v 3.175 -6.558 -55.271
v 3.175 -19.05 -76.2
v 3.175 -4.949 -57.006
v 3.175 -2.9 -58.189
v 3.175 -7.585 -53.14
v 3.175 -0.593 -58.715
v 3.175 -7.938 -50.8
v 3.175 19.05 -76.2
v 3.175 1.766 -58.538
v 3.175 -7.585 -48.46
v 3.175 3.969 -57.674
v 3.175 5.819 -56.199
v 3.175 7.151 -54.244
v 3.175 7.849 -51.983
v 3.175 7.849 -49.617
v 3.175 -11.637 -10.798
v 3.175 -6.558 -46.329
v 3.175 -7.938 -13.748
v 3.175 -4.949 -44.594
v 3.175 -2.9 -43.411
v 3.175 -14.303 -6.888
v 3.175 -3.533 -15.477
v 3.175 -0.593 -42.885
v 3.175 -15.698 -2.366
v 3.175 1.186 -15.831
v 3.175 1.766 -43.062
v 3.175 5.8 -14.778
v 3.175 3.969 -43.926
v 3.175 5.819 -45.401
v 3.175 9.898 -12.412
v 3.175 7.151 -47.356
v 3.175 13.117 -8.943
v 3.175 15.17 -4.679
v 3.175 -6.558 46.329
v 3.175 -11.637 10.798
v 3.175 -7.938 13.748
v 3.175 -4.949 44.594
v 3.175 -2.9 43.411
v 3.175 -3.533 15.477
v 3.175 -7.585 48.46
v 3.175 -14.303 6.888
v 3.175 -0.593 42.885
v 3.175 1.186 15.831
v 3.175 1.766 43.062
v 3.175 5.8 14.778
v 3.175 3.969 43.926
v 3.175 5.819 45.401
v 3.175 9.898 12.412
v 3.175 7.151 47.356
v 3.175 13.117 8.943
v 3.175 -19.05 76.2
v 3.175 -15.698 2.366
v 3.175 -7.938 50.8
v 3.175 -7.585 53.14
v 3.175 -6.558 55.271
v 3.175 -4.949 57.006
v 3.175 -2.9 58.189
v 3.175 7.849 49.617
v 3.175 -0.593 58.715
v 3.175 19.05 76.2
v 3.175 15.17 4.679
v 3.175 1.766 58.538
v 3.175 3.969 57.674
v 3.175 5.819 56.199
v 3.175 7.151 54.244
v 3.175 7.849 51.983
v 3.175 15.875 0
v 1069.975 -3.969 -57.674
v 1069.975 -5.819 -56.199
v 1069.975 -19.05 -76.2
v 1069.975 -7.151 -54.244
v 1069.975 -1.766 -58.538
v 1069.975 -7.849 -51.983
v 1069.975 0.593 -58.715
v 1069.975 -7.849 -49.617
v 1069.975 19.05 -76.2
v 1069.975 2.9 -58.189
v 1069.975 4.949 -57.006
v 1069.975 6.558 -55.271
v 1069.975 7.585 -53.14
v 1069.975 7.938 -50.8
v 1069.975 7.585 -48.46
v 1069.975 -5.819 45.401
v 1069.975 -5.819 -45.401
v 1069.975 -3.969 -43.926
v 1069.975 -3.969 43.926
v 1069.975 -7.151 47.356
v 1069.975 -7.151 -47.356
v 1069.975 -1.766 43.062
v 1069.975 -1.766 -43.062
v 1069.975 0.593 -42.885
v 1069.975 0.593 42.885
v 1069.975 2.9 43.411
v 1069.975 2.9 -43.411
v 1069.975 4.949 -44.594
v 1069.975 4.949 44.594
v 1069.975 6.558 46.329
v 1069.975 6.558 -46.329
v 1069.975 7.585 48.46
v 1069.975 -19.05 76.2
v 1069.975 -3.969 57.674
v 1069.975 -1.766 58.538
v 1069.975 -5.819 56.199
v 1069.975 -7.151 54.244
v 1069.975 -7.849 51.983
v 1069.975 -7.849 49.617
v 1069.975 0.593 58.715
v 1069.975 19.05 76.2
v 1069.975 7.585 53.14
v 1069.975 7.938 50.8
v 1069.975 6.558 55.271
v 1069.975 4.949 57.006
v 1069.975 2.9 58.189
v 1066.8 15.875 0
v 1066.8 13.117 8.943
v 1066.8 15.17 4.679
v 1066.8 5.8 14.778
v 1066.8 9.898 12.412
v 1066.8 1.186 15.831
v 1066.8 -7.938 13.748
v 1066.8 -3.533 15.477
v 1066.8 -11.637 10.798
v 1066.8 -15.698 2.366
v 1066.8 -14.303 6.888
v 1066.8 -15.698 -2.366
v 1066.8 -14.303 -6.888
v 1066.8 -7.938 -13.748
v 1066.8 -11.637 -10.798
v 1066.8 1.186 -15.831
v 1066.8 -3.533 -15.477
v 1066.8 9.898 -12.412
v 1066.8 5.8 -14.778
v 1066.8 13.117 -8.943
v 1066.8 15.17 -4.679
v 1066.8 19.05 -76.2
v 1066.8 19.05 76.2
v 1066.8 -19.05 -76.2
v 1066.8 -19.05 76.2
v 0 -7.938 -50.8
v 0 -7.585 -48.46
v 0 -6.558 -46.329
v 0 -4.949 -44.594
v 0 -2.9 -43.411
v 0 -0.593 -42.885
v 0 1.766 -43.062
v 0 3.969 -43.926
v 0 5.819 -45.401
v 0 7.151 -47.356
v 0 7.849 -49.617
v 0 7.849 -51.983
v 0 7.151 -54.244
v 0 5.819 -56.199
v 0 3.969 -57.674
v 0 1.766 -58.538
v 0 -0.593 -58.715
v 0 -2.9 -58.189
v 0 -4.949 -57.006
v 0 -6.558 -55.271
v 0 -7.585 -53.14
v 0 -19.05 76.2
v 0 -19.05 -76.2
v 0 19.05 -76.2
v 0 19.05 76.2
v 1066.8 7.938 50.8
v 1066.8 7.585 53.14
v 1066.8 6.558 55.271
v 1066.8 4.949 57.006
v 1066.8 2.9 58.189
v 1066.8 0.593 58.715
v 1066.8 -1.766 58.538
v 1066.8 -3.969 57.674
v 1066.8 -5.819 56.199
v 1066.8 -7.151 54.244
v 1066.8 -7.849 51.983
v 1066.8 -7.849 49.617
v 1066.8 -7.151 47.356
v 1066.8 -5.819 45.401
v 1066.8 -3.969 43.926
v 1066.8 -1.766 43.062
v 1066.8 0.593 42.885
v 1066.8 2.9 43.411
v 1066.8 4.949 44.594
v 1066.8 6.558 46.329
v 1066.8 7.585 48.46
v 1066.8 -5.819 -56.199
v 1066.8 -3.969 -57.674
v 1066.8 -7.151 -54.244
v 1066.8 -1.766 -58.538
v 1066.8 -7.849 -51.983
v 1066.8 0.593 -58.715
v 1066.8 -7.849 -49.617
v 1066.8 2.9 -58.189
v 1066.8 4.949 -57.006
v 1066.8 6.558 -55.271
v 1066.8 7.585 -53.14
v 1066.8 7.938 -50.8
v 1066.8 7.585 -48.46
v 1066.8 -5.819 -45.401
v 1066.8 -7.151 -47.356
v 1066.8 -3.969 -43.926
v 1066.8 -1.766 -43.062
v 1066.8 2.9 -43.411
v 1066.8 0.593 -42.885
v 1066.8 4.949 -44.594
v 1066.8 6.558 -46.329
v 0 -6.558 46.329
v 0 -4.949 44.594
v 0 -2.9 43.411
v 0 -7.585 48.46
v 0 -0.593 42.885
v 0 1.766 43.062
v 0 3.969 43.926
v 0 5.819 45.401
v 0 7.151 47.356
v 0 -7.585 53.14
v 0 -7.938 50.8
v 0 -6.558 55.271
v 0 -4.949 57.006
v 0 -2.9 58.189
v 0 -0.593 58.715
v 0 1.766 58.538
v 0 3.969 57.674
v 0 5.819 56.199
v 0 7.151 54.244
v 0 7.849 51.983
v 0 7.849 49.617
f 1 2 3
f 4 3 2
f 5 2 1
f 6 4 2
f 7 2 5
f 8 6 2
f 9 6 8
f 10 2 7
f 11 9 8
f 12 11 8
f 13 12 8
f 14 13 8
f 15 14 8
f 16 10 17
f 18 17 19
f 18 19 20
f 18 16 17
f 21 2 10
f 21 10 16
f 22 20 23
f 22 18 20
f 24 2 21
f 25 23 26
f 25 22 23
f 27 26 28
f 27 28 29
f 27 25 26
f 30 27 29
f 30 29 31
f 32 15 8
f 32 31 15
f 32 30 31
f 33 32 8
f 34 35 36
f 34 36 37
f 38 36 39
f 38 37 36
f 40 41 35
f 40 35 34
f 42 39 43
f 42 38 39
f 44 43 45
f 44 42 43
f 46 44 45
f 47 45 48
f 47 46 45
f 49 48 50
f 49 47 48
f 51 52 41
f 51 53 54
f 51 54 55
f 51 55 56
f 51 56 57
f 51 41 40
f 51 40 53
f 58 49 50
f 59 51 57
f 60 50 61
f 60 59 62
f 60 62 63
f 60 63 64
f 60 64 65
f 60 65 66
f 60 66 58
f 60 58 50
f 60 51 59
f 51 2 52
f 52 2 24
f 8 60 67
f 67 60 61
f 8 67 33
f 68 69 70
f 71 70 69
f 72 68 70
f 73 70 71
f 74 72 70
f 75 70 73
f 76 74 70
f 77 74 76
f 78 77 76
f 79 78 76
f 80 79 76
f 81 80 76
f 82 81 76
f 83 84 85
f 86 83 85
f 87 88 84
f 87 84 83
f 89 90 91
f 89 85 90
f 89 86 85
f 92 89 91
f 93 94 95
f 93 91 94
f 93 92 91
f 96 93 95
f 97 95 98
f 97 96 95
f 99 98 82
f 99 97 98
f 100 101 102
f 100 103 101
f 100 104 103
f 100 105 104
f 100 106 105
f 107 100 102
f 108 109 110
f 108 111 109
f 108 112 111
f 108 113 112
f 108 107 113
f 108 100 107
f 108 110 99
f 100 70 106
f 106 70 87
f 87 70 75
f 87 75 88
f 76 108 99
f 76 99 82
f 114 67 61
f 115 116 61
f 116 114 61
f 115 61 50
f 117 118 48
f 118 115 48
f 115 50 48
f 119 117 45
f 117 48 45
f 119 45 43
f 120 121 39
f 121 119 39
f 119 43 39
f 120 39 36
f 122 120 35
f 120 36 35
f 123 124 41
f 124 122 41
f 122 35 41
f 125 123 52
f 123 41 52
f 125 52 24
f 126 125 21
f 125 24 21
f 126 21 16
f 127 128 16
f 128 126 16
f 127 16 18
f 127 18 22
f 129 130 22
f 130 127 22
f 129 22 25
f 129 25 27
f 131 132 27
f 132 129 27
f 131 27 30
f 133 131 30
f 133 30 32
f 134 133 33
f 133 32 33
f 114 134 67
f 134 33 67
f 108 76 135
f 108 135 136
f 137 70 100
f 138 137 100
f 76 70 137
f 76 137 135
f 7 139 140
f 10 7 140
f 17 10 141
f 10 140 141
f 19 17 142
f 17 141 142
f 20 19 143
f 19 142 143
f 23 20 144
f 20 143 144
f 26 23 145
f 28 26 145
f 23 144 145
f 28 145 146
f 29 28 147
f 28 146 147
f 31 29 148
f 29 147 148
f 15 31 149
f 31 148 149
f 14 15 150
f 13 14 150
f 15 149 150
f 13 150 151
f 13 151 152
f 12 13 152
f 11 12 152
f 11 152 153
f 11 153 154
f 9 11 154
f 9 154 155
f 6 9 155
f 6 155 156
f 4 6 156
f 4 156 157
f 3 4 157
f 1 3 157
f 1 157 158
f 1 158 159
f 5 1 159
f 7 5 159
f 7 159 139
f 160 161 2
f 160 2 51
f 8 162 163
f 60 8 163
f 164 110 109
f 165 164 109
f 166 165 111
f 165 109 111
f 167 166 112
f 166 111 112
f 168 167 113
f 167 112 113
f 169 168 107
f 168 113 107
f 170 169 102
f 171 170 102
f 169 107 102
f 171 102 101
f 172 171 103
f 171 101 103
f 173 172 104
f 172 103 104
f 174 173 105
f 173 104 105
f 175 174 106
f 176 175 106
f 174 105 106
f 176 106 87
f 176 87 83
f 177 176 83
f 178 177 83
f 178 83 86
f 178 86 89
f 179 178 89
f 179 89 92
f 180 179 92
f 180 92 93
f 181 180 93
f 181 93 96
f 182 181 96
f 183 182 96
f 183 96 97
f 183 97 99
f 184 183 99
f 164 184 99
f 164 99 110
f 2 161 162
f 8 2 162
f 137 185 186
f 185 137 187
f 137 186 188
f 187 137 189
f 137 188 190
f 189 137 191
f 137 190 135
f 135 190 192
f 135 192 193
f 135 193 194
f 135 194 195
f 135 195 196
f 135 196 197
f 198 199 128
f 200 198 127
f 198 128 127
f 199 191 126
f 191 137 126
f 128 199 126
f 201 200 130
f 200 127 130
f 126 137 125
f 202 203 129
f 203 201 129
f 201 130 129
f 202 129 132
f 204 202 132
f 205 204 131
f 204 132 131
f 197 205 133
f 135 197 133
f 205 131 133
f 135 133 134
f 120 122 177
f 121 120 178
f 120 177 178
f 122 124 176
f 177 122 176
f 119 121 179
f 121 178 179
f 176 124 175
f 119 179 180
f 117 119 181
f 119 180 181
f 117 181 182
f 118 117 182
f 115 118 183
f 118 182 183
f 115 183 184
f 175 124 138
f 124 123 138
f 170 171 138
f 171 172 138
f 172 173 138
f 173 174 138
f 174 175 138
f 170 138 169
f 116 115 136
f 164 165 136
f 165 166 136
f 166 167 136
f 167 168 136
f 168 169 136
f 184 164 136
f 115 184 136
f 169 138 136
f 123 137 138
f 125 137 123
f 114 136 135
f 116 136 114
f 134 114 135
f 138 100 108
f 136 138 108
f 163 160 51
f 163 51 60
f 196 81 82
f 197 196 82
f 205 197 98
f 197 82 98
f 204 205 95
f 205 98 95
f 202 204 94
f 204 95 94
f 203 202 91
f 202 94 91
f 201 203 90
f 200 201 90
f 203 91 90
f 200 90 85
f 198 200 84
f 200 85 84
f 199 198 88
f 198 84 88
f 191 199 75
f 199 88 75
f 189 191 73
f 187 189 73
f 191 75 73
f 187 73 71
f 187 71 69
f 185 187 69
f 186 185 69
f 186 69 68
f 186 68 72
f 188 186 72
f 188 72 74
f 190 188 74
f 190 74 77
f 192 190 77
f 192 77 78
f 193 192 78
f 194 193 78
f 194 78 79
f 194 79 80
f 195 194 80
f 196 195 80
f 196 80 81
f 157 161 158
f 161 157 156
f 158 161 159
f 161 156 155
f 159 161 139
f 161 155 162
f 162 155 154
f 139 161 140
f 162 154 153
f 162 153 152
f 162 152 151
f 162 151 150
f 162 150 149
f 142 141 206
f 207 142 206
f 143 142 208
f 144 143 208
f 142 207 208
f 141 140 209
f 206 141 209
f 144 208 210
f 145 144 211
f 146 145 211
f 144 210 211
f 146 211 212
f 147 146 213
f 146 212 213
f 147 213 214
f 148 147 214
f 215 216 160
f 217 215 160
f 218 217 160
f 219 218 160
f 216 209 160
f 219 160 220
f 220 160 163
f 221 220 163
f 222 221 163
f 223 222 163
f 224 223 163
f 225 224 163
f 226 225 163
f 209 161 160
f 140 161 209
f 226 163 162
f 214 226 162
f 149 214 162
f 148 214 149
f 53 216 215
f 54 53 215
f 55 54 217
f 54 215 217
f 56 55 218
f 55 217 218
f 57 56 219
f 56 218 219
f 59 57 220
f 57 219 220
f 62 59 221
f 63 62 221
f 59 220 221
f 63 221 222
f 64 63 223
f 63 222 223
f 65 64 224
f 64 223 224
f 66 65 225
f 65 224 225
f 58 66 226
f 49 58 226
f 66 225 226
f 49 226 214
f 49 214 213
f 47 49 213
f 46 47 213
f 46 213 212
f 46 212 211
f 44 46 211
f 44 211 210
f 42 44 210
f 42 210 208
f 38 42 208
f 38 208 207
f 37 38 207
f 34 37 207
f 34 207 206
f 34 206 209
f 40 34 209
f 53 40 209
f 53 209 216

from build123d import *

# Parameters (mm, degrees)
F0_R     = 15.875
F1_DEPTH = 1069.975
F2_W     = 38.1
F2_H     = 152.4
F3_DEPTH = 3.175
F5_D     = 15.875
F6_W     = 38.1
F6_H     = 152.4
F7_DEPTH = 3.175
F9_D     = 15.875


with BuildPart() as f1:
    # F0 (on Right) → F1 (new body)
    with BuildSketch(Plane.YZ):
        Circle(F0_R)
    extrude(amount=F1_DEPTH)

    # F2 (on Right) → F3 (join)
    with BuildSketch(Plane.YZ):
        Rectangle(F2_W, F2_H)
    extrude(amount=F3_DEPTH)

    # F5 (through all)
    with Locations(Plane.YZ.offset(1069.975)):
        with Locations((0, 50.8), (0, -50.8)):
            Hole(F5_D / 2)

    # F6 (on face) → F7 (join)
    with BuildSketch(Plane.YZ.offset(1069.975)):
        Rectangle(F6_W, F6_H)
    extrude(amount=-F7_DEPTH)

    # F9 (through all)
    with Locations(Plane(origin=(0, 0, 0), x_dir=(0, -1, 0), z_dir=(-1, 0, 0))):
        with Locations((0, 50.8), (0, -50.8)):
            Hole(F9_D / 2)


solid = f1.part
